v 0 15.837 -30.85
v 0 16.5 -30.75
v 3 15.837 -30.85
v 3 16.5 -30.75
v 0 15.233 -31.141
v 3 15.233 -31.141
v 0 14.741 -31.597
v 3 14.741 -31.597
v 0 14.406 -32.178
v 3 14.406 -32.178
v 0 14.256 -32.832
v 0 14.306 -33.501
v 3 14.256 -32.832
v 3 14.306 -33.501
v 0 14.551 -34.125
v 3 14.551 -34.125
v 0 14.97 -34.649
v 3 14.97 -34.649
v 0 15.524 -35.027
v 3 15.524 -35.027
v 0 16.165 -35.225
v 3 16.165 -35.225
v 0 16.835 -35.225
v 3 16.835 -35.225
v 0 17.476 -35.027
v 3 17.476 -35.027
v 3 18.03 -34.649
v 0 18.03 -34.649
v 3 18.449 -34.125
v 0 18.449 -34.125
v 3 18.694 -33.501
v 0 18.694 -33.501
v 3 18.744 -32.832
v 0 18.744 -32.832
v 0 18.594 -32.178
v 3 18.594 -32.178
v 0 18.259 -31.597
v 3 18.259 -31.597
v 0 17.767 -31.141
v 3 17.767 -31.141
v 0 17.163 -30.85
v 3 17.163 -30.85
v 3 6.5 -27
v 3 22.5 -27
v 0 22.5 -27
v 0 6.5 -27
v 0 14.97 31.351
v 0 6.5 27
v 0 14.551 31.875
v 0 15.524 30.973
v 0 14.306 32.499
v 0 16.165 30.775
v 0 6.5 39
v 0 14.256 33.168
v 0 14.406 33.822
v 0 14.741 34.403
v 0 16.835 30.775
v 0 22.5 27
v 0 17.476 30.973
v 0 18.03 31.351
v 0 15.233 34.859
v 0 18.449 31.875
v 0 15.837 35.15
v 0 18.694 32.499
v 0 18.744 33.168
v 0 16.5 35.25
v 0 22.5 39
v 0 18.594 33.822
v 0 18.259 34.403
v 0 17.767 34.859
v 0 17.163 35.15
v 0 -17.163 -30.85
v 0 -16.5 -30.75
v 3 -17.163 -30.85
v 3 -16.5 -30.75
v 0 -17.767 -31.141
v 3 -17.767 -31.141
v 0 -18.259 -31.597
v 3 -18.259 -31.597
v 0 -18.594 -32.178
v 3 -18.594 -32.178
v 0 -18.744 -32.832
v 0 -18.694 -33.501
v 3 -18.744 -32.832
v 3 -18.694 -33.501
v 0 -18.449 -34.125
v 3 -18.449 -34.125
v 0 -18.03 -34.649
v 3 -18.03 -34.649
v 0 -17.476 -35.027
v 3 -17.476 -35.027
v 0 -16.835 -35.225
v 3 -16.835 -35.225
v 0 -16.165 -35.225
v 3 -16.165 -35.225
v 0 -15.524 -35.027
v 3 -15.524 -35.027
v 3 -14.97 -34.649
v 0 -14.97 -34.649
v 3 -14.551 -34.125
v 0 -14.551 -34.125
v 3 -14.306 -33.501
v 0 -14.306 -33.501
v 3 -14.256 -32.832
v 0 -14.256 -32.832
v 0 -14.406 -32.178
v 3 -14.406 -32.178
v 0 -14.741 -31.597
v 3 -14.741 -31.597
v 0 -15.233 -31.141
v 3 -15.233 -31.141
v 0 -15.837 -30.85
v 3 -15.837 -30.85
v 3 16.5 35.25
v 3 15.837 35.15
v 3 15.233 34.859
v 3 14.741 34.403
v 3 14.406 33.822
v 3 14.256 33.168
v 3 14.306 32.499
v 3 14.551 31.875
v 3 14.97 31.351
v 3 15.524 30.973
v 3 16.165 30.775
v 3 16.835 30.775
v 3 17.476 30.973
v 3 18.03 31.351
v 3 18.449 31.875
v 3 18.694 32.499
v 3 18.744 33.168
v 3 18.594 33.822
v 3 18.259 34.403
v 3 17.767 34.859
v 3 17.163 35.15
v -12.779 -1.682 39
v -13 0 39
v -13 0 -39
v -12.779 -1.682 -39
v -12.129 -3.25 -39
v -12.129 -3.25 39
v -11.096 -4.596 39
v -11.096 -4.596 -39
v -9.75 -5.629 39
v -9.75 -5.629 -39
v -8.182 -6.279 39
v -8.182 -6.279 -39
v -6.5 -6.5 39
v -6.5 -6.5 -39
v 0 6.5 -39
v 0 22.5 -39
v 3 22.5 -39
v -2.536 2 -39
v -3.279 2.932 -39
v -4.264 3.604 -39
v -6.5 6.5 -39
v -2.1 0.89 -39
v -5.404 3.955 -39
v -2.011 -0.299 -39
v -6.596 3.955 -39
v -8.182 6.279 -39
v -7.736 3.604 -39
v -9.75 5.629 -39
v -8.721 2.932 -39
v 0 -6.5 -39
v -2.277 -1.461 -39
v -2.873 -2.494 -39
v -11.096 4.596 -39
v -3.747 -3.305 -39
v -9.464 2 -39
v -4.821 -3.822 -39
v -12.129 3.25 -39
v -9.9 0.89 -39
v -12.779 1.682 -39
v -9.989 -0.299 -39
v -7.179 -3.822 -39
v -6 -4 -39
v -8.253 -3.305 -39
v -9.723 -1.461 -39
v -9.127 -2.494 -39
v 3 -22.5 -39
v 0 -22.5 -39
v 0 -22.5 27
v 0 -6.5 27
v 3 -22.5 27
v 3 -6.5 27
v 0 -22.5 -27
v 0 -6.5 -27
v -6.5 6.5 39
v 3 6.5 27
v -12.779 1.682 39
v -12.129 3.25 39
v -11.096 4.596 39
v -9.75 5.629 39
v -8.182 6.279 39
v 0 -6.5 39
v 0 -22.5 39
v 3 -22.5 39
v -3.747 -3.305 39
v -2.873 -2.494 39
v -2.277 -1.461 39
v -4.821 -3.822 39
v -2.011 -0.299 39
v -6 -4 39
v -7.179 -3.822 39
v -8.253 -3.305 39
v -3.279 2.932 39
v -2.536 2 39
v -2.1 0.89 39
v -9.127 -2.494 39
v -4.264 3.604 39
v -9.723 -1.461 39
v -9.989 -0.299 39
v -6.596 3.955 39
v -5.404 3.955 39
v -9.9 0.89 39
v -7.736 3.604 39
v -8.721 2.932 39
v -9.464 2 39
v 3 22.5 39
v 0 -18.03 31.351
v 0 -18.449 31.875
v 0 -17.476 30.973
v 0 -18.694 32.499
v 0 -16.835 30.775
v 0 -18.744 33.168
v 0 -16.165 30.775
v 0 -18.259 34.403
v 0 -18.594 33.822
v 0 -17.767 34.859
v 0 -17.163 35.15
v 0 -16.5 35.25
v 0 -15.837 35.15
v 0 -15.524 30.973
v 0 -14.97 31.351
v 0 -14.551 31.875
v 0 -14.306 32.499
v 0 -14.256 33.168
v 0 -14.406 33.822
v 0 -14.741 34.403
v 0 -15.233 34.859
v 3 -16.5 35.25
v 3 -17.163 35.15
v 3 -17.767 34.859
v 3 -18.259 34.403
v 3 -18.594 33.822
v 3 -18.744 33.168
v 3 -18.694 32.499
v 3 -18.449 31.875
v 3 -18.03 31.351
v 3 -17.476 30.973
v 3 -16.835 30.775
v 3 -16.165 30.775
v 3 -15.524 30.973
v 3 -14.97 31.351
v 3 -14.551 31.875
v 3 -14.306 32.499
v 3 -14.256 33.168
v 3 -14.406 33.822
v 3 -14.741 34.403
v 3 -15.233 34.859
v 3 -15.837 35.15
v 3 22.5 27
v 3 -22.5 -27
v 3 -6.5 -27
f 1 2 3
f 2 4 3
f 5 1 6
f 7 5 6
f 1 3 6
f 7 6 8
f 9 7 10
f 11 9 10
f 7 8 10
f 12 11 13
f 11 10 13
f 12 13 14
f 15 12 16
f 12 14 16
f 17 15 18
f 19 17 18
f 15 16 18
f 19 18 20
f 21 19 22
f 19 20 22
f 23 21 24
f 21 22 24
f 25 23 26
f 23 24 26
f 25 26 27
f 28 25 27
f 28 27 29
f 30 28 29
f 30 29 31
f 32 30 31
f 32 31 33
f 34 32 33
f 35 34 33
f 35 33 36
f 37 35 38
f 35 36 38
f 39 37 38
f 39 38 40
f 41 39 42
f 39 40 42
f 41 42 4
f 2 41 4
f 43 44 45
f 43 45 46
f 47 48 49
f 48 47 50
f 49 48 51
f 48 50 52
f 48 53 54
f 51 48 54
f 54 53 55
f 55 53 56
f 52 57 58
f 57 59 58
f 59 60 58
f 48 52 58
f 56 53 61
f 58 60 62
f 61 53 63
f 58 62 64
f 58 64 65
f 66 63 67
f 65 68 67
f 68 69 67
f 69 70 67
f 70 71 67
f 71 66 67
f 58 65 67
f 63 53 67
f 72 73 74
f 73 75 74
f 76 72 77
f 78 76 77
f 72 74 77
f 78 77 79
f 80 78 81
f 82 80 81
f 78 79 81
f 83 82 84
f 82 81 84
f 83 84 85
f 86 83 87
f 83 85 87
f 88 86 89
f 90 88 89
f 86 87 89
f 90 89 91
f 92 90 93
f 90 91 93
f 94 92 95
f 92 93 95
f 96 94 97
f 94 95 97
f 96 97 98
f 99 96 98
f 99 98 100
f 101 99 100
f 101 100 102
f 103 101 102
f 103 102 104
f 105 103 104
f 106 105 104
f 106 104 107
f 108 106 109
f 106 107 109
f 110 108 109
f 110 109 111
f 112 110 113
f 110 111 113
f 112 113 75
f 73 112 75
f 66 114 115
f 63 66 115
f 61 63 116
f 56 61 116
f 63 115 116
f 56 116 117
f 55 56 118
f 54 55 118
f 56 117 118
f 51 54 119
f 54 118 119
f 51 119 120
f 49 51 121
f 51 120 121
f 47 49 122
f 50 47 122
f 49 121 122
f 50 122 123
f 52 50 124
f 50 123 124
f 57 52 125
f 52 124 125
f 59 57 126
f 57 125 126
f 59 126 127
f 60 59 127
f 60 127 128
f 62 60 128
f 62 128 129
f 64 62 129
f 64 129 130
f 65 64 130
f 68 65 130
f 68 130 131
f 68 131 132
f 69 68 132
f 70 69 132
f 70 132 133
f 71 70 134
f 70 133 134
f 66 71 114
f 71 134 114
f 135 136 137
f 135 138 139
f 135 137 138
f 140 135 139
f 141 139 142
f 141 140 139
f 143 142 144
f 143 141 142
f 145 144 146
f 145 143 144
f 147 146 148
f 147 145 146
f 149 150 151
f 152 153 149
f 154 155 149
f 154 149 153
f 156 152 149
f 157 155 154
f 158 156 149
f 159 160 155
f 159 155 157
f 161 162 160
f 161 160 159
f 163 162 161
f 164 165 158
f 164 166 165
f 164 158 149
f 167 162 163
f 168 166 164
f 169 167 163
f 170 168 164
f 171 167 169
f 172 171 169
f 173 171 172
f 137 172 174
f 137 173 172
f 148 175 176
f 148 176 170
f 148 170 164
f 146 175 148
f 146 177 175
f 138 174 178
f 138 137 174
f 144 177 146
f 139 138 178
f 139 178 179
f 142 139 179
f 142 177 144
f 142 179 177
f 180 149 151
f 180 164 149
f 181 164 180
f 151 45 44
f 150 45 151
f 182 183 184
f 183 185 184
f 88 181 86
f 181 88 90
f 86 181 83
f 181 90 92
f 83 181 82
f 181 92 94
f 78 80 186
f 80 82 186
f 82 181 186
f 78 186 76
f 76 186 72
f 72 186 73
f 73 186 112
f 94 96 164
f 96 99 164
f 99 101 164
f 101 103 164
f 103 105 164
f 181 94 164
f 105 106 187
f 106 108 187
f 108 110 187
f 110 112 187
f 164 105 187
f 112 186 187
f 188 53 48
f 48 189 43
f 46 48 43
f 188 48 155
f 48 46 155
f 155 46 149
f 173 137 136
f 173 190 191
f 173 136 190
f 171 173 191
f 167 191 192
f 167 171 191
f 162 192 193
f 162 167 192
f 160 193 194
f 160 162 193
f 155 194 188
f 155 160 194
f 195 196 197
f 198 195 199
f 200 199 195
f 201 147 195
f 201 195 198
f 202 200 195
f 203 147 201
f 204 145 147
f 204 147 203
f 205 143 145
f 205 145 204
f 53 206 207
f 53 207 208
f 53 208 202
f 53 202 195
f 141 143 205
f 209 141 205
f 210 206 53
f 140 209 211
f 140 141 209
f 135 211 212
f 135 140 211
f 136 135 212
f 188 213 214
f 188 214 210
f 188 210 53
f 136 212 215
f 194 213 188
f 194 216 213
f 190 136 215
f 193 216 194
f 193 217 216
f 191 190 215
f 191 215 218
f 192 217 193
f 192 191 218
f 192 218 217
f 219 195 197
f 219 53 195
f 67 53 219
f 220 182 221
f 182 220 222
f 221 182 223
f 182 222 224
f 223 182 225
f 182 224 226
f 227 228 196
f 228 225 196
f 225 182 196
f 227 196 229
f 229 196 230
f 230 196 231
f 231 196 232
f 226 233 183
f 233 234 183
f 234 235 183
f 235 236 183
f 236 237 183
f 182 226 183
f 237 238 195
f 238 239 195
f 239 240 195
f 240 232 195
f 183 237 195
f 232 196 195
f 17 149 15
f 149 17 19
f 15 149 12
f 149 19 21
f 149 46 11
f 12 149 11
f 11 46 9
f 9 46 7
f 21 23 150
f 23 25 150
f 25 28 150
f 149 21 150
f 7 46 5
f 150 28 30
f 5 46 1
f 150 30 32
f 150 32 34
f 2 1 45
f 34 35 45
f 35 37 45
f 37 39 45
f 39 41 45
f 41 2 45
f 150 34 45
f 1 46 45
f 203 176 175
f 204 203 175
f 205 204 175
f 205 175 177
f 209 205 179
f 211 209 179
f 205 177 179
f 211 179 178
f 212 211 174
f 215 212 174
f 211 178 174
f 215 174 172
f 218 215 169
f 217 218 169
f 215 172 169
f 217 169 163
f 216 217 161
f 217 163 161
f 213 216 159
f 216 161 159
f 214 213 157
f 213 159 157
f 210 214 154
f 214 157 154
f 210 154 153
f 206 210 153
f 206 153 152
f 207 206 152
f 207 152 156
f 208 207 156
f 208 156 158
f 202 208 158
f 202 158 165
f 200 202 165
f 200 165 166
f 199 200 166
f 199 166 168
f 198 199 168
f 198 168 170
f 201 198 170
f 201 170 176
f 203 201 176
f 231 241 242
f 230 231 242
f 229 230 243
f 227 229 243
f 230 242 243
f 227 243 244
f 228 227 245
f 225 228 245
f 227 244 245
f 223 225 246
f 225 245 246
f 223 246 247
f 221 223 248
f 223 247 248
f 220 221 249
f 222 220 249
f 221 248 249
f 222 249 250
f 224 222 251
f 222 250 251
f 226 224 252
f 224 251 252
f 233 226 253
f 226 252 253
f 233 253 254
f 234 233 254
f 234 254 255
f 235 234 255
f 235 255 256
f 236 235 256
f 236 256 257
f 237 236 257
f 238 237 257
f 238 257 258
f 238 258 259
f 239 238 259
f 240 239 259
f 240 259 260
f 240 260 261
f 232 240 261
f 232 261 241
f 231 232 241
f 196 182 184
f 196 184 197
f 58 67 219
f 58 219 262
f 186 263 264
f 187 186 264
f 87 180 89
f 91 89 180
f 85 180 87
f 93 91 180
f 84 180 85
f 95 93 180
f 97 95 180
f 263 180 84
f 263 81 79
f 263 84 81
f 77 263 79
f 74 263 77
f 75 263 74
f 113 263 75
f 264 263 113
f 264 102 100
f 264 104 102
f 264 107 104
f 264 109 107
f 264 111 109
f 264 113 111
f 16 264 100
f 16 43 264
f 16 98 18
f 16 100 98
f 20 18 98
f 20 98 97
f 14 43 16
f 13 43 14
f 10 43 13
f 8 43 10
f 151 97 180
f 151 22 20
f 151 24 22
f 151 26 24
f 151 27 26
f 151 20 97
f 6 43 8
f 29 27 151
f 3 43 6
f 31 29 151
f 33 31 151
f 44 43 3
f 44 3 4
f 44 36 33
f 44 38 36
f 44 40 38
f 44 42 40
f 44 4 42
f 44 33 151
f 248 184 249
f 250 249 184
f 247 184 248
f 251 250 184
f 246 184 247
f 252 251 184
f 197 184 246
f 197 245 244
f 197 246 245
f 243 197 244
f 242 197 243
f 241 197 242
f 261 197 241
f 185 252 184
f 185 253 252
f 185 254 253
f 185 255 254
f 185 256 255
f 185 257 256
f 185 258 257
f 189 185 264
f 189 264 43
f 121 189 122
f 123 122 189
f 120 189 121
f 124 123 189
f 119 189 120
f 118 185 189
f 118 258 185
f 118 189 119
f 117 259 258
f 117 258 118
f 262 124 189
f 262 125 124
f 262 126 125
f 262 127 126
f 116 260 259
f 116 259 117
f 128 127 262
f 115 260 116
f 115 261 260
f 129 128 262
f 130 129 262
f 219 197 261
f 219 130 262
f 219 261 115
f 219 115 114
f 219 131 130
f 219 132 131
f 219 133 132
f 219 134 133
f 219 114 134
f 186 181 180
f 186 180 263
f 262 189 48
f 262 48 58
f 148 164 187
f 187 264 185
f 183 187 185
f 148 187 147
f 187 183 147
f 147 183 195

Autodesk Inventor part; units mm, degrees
ref_plane "YZ Plane" through (0, 0, 0) normal (1, 0, 0) x (0, 1, 0)
ref_plane "XZ Plane" through (0, 0, 0) normal (0, 1, 0) x (-1, 0, 0)
ref_plane "XY Plane" through (0, 0, 0) normal (0, 0, 1) x (1, 0, 0)
sketch "Sketch1" plane through (0, 0, 0) normal (1, 0, 0) x (0, 1, 0)
  line L0 (-22.5, 39) -> (22.5, 39)
  line L1 (22.5, -39) -> (-22.5, -39)
  line L2 (-22.5, 39) -> (22.5, -39) construction
  line L3 (22.5, 39) -> (-22.5, -39) construction
  line L4 (22.5, 39) -> (22.5, -39)
  line L5 (-22.5, -39) -> (-22.5, 39)
  line L6 (22.5, 0) -> (-22.5, 0)
  point P0 (0, 0)
  point P1 (16.5, 33)
  point P2 (-16.5, 33)
  point P3 (16.5, -33)
  point P4 (-16.5, -33)
  dimension "d43" = 78
  dimension "d44" = 45
  dimension "d45" = 6
  dimension "d46" = 6
  dimension "d47" = 6
  dimension "d48" = 6
extrude "Extrusion3" add sketch "Sketch1" along normal blind 3
hole "Hole3" at (0, 16.5, 33) at (0, 16.5, -33) at (0, -16.5, -33) at (0, -16.5, 33) direction (1, 0, 0) diameter 4.5 end through all clearance for "Flat Head Machine Screw" size "M4" standard "Ansi Metric M Profile"
sketch "Sketch4" plane through (0, 0, 0) normal (-1, 0, 0) x (0, 0, 1)
  line L0 (39, 22.5) -> (39, -22.5) projected
  line L1 (-39, -6.5) -> (39, -6.5)
  line L2 (39, -6.5) -> (39, 6.5)
  line L3 (39, 6.5) -> (-39, 6.5)
  line L4 (-39, 6.5) -> (-39, -6.5)
  line L5 (-39, -6.5) -> (39, 6.5) construction
  line L6 (39, -6.5) -> (-39, 6.5) construction
  point P0 (0, 0)
  dimension "d49" = 13
extrude "Extrusion4" add sketch "Sketch4" along normal blind 13
full round fillet "Full Round Fillet2" first side at (-4.3333, -6.5, -13) centre faces at (-13, 2.1667, -13) second side at (-4.3333, 6.5, 13)
sketch "Sketch5" plane through (0, -22.5, 39) normal (0, 0, 1) x (1, 0, 0)
  line L0 (0, 29) -> (-6.5, 29) projected
  point P0 (0, 22.5)
  point P1 (-6, 22.5)
  dimension "d52" = 6
  dimension "d53" = 6.5
hole "Hole4" at (-6, 0, 39) direction (0, 0, -1) diameter 8 end through all
sketch "Sketch6" plane through (3, 0, 0) normal (1, 0, 0) x (0, 0, -1)
  line L0 (39, 22.5) -> (-39, 22.5) projected
  line L1 (39, 6.5) -> (-39, 6.5) projected
  line L2 (-27, 22.5) -> (27, 22.5)
  line L3 (27, 22.5) -> (27, 6.5)
  line L4 (27, 6.5) -> (-27, 6.5)
  line L5 (-27, 6.5) -> (-27, 22.5)
  line L6 (-39, -22.5) -> (39, -22.5) projected
  line L7 (-27, -22.5) -> (27, -22.5)
  line L8 (27, -22.5) -> (27, -6.5)
  line L9 (27, -6.5) -> (-27, -6.5)
  line L10 (-27, -6.5) -> (-27, -22.5)
  line L11 (-39, -6.5) -> (39, -6.5) projected
  circle A0 centre (33, 16.5) radius 2.25 projected
  circle A1 centre (-33, 16.5) radius 2.25 projected
  point P0 (0, 0)
  point P1 (27, -22.5)
  dimension "d61" = 0
  dimension "d62" = 6
  dimension "d63" = 6
extrude "Extrusion5" cut sketch "Sketch6" against normal blind 10 contours L3 L1 L5 L0 | L10 L9 L8 L6
properties part number "Axle Hold"
